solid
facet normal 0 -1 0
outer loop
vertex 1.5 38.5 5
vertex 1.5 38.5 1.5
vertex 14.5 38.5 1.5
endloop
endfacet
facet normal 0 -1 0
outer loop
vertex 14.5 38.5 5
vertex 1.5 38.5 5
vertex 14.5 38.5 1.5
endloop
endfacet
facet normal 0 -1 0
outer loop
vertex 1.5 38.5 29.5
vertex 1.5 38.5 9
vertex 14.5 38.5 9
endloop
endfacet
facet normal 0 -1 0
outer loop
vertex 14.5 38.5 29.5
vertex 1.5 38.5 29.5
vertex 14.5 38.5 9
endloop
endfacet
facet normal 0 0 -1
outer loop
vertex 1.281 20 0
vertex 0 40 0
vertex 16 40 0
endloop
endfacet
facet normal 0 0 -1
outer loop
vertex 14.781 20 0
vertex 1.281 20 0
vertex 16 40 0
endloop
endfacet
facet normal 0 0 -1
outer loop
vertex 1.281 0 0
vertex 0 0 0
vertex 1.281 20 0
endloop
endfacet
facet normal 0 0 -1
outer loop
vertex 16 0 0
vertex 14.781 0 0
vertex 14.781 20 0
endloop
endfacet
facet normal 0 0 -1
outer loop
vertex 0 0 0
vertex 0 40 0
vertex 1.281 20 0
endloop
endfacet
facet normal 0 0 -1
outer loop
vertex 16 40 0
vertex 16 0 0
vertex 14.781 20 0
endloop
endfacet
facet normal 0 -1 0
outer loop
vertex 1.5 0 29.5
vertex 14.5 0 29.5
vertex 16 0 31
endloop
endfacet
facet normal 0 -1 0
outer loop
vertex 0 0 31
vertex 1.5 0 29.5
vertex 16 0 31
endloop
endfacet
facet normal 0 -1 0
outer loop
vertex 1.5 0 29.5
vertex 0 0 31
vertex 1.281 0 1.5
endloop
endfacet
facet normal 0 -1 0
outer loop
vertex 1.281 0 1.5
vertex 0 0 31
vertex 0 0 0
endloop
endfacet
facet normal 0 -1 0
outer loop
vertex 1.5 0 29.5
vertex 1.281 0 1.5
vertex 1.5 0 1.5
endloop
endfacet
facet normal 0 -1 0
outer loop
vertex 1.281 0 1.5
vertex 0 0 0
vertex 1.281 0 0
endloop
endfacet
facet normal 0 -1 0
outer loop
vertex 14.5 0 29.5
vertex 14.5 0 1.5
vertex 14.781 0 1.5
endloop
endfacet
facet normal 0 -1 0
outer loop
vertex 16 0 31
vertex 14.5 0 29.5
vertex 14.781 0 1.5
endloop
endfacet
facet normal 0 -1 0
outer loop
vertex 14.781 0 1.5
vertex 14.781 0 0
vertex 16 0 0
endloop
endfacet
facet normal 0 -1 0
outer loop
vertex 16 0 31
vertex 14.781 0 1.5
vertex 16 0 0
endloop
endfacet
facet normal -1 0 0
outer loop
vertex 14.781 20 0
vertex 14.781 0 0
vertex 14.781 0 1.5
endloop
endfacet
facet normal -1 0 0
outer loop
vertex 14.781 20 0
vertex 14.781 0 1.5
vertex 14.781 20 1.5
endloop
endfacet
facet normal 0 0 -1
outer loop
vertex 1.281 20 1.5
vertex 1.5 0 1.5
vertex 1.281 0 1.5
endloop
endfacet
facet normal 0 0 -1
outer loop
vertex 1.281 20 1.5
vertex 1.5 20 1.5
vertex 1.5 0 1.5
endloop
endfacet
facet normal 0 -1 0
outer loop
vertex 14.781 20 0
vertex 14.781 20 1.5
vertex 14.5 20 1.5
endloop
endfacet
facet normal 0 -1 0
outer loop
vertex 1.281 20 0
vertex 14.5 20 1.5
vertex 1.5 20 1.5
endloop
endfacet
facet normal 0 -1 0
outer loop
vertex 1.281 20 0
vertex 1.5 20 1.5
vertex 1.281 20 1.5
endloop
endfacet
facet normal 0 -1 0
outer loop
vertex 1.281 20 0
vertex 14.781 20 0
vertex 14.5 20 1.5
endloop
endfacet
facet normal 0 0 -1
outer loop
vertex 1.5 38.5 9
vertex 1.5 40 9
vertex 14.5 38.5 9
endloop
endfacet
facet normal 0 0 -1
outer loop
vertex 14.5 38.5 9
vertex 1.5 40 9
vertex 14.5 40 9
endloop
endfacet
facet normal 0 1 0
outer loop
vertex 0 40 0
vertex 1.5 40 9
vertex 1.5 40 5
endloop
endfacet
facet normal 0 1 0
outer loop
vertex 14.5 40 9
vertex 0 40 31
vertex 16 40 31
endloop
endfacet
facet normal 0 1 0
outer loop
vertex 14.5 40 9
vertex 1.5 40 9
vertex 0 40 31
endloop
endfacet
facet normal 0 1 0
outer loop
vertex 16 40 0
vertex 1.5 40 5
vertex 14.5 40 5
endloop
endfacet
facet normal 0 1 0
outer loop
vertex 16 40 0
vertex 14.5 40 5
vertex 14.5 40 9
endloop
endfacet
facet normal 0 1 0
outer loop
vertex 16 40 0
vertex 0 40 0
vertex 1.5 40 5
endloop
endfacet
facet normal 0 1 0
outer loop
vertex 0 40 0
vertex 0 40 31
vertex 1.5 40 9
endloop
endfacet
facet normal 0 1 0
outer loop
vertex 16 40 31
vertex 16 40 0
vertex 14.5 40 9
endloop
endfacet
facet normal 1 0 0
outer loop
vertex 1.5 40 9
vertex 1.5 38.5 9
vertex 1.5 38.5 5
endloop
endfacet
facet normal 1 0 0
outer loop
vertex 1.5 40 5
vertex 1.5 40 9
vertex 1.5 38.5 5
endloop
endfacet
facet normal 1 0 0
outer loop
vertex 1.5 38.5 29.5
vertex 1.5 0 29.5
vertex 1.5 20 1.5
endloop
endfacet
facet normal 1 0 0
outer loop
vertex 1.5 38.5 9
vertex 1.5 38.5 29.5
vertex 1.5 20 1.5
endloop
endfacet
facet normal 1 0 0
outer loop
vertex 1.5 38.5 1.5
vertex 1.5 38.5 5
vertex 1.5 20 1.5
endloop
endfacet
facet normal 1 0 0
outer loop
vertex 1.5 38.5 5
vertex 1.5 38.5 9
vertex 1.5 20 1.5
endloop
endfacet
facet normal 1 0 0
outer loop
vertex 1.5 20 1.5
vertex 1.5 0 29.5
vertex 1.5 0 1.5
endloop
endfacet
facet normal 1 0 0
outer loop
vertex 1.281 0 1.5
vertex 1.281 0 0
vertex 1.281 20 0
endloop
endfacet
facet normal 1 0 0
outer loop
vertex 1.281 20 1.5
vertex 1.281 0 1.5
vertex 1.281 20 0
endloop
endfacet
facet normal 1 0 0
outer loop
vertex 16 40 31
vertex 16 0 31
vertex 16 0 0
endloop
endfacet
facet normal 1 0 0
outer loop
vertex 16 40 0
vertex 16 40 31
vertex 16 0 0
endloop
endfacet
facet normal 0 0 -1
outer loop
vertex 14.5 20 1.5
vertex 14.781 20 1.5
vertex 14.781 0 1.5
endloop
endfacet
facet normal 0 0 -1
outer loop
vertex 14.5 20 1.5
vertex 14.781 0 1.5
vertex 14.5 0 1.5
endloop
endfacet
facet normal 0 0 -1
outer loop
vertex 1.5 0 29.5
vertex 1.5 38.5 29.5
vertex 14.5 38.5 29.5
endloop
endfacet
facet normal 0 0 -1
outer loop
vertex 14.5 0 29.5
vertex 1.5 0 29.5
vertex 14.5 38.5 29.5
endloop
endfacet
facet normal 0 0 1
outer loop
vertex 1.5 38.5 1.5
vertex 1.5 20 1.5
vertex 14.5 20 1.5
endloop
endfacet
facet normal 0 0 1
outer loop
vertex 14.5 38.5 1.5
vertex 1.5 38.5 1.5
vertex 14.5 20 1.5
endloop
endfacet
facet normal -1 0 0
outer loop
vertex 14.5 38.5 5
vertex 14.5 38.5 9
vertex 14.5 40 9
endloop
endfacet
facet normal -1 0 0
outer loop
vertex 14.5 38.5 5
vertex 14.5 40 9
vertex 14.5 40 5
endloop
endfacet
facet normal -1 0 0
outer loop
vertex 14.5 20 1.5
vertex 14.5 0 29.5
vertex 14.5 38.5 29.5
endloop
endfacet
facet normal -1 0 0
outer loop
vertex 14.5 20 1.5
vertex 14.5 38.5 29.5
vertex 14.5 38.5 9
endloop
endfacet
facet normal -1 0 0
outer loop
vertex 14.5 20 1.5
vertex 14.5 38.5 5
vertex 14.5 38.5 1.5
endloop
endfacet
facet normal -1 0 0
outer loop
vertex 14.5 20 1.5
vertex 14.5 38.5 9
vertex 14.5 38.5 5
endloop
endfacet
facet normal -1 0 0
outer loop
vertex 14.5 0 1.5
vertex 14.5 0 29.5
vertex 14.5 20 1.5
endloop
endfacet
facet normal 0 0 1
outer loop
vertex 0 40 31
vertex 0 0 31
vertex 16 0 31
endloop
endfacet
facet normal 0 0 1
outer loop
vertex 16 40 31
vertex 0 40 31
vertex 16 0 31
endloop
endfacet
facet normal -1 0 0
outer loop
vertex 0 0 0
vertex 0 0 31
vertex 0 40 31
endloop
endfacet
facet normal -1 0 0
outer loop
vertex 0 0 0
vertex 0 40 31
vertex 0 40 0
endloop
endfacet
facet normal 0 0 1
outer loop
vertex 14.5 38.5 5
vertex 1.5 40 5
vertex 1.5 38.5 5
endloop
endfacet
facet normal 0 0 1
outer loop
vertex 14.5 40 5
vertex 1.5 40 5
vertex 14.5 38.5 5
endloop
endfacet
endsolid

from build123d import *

# Parameters (mm, degrees)
SKETCH1_W           = 16
SKETCH1_H           = 31
BOSS_EXTRUDE1_DEPTH = 40
SHELL1_T            = -1.5
SKETCH2_W           = 13
SKETCH2_H           = 4
CUT_EXTRUDE1_DEPTH  = 1.5
SKETCH3_W           = 13.5
SKETCH3_H           = 21
CUT_EXTRUDE2_DEPTH  = 1.5


with BuildPart() as part:
    # Sketch1 → Boss-Extrude1 (new body)
    with BuildSketch(Plane(origin=(0, 0, 0), x_dir=(1, 0, 0), z_dir=(0, 1, 0))):
        with Locations((8, -15.5)):
            Rectangle(SKETCH1_W, SKETCH1_H)
    extrude(amount=BOSS_EXTRUDE1_DEPTH)

    # Shell1
    shell1_openings = [part.faces().sort_by_distance(p)[0] for p in [
        (8, 0, 15.5),
    ]]
    offset(amount=SHELL1_T, openings=shell1_openings, kind=Kind.INTERSECTION)

    # Sketch2 → Cut-Extrude1 (cut)
    with BuildSketch(Plane(origin=(0, 40, 0), x_dir=(1, 0, 0), z_dir=(0, 1, 0))):
        with Locations((8, -7)):
            Rectangle(SKETCH2_W, SKETCH2_H)
    extrude(amount=-CUT_EXTRUDE1_DEPTH, mode=Mode.SUBTRACT)

    # Sketch3 → Cut-Extrude2 (cut)
    with BuildSketch(Plane(origin=(0, 0, 0), x_dir=(-1, 0, 0), z_dir=(0, 0, -1))):
        with Locations((-8.031141197, 9.5)):
            Rectangle(SKETCH3_W, SKETCH3_H)
    extrude(amount=-CUT_EXTRUDE2_DEPTH, mode=Mode.SUBTRACT)


solid = part.part
